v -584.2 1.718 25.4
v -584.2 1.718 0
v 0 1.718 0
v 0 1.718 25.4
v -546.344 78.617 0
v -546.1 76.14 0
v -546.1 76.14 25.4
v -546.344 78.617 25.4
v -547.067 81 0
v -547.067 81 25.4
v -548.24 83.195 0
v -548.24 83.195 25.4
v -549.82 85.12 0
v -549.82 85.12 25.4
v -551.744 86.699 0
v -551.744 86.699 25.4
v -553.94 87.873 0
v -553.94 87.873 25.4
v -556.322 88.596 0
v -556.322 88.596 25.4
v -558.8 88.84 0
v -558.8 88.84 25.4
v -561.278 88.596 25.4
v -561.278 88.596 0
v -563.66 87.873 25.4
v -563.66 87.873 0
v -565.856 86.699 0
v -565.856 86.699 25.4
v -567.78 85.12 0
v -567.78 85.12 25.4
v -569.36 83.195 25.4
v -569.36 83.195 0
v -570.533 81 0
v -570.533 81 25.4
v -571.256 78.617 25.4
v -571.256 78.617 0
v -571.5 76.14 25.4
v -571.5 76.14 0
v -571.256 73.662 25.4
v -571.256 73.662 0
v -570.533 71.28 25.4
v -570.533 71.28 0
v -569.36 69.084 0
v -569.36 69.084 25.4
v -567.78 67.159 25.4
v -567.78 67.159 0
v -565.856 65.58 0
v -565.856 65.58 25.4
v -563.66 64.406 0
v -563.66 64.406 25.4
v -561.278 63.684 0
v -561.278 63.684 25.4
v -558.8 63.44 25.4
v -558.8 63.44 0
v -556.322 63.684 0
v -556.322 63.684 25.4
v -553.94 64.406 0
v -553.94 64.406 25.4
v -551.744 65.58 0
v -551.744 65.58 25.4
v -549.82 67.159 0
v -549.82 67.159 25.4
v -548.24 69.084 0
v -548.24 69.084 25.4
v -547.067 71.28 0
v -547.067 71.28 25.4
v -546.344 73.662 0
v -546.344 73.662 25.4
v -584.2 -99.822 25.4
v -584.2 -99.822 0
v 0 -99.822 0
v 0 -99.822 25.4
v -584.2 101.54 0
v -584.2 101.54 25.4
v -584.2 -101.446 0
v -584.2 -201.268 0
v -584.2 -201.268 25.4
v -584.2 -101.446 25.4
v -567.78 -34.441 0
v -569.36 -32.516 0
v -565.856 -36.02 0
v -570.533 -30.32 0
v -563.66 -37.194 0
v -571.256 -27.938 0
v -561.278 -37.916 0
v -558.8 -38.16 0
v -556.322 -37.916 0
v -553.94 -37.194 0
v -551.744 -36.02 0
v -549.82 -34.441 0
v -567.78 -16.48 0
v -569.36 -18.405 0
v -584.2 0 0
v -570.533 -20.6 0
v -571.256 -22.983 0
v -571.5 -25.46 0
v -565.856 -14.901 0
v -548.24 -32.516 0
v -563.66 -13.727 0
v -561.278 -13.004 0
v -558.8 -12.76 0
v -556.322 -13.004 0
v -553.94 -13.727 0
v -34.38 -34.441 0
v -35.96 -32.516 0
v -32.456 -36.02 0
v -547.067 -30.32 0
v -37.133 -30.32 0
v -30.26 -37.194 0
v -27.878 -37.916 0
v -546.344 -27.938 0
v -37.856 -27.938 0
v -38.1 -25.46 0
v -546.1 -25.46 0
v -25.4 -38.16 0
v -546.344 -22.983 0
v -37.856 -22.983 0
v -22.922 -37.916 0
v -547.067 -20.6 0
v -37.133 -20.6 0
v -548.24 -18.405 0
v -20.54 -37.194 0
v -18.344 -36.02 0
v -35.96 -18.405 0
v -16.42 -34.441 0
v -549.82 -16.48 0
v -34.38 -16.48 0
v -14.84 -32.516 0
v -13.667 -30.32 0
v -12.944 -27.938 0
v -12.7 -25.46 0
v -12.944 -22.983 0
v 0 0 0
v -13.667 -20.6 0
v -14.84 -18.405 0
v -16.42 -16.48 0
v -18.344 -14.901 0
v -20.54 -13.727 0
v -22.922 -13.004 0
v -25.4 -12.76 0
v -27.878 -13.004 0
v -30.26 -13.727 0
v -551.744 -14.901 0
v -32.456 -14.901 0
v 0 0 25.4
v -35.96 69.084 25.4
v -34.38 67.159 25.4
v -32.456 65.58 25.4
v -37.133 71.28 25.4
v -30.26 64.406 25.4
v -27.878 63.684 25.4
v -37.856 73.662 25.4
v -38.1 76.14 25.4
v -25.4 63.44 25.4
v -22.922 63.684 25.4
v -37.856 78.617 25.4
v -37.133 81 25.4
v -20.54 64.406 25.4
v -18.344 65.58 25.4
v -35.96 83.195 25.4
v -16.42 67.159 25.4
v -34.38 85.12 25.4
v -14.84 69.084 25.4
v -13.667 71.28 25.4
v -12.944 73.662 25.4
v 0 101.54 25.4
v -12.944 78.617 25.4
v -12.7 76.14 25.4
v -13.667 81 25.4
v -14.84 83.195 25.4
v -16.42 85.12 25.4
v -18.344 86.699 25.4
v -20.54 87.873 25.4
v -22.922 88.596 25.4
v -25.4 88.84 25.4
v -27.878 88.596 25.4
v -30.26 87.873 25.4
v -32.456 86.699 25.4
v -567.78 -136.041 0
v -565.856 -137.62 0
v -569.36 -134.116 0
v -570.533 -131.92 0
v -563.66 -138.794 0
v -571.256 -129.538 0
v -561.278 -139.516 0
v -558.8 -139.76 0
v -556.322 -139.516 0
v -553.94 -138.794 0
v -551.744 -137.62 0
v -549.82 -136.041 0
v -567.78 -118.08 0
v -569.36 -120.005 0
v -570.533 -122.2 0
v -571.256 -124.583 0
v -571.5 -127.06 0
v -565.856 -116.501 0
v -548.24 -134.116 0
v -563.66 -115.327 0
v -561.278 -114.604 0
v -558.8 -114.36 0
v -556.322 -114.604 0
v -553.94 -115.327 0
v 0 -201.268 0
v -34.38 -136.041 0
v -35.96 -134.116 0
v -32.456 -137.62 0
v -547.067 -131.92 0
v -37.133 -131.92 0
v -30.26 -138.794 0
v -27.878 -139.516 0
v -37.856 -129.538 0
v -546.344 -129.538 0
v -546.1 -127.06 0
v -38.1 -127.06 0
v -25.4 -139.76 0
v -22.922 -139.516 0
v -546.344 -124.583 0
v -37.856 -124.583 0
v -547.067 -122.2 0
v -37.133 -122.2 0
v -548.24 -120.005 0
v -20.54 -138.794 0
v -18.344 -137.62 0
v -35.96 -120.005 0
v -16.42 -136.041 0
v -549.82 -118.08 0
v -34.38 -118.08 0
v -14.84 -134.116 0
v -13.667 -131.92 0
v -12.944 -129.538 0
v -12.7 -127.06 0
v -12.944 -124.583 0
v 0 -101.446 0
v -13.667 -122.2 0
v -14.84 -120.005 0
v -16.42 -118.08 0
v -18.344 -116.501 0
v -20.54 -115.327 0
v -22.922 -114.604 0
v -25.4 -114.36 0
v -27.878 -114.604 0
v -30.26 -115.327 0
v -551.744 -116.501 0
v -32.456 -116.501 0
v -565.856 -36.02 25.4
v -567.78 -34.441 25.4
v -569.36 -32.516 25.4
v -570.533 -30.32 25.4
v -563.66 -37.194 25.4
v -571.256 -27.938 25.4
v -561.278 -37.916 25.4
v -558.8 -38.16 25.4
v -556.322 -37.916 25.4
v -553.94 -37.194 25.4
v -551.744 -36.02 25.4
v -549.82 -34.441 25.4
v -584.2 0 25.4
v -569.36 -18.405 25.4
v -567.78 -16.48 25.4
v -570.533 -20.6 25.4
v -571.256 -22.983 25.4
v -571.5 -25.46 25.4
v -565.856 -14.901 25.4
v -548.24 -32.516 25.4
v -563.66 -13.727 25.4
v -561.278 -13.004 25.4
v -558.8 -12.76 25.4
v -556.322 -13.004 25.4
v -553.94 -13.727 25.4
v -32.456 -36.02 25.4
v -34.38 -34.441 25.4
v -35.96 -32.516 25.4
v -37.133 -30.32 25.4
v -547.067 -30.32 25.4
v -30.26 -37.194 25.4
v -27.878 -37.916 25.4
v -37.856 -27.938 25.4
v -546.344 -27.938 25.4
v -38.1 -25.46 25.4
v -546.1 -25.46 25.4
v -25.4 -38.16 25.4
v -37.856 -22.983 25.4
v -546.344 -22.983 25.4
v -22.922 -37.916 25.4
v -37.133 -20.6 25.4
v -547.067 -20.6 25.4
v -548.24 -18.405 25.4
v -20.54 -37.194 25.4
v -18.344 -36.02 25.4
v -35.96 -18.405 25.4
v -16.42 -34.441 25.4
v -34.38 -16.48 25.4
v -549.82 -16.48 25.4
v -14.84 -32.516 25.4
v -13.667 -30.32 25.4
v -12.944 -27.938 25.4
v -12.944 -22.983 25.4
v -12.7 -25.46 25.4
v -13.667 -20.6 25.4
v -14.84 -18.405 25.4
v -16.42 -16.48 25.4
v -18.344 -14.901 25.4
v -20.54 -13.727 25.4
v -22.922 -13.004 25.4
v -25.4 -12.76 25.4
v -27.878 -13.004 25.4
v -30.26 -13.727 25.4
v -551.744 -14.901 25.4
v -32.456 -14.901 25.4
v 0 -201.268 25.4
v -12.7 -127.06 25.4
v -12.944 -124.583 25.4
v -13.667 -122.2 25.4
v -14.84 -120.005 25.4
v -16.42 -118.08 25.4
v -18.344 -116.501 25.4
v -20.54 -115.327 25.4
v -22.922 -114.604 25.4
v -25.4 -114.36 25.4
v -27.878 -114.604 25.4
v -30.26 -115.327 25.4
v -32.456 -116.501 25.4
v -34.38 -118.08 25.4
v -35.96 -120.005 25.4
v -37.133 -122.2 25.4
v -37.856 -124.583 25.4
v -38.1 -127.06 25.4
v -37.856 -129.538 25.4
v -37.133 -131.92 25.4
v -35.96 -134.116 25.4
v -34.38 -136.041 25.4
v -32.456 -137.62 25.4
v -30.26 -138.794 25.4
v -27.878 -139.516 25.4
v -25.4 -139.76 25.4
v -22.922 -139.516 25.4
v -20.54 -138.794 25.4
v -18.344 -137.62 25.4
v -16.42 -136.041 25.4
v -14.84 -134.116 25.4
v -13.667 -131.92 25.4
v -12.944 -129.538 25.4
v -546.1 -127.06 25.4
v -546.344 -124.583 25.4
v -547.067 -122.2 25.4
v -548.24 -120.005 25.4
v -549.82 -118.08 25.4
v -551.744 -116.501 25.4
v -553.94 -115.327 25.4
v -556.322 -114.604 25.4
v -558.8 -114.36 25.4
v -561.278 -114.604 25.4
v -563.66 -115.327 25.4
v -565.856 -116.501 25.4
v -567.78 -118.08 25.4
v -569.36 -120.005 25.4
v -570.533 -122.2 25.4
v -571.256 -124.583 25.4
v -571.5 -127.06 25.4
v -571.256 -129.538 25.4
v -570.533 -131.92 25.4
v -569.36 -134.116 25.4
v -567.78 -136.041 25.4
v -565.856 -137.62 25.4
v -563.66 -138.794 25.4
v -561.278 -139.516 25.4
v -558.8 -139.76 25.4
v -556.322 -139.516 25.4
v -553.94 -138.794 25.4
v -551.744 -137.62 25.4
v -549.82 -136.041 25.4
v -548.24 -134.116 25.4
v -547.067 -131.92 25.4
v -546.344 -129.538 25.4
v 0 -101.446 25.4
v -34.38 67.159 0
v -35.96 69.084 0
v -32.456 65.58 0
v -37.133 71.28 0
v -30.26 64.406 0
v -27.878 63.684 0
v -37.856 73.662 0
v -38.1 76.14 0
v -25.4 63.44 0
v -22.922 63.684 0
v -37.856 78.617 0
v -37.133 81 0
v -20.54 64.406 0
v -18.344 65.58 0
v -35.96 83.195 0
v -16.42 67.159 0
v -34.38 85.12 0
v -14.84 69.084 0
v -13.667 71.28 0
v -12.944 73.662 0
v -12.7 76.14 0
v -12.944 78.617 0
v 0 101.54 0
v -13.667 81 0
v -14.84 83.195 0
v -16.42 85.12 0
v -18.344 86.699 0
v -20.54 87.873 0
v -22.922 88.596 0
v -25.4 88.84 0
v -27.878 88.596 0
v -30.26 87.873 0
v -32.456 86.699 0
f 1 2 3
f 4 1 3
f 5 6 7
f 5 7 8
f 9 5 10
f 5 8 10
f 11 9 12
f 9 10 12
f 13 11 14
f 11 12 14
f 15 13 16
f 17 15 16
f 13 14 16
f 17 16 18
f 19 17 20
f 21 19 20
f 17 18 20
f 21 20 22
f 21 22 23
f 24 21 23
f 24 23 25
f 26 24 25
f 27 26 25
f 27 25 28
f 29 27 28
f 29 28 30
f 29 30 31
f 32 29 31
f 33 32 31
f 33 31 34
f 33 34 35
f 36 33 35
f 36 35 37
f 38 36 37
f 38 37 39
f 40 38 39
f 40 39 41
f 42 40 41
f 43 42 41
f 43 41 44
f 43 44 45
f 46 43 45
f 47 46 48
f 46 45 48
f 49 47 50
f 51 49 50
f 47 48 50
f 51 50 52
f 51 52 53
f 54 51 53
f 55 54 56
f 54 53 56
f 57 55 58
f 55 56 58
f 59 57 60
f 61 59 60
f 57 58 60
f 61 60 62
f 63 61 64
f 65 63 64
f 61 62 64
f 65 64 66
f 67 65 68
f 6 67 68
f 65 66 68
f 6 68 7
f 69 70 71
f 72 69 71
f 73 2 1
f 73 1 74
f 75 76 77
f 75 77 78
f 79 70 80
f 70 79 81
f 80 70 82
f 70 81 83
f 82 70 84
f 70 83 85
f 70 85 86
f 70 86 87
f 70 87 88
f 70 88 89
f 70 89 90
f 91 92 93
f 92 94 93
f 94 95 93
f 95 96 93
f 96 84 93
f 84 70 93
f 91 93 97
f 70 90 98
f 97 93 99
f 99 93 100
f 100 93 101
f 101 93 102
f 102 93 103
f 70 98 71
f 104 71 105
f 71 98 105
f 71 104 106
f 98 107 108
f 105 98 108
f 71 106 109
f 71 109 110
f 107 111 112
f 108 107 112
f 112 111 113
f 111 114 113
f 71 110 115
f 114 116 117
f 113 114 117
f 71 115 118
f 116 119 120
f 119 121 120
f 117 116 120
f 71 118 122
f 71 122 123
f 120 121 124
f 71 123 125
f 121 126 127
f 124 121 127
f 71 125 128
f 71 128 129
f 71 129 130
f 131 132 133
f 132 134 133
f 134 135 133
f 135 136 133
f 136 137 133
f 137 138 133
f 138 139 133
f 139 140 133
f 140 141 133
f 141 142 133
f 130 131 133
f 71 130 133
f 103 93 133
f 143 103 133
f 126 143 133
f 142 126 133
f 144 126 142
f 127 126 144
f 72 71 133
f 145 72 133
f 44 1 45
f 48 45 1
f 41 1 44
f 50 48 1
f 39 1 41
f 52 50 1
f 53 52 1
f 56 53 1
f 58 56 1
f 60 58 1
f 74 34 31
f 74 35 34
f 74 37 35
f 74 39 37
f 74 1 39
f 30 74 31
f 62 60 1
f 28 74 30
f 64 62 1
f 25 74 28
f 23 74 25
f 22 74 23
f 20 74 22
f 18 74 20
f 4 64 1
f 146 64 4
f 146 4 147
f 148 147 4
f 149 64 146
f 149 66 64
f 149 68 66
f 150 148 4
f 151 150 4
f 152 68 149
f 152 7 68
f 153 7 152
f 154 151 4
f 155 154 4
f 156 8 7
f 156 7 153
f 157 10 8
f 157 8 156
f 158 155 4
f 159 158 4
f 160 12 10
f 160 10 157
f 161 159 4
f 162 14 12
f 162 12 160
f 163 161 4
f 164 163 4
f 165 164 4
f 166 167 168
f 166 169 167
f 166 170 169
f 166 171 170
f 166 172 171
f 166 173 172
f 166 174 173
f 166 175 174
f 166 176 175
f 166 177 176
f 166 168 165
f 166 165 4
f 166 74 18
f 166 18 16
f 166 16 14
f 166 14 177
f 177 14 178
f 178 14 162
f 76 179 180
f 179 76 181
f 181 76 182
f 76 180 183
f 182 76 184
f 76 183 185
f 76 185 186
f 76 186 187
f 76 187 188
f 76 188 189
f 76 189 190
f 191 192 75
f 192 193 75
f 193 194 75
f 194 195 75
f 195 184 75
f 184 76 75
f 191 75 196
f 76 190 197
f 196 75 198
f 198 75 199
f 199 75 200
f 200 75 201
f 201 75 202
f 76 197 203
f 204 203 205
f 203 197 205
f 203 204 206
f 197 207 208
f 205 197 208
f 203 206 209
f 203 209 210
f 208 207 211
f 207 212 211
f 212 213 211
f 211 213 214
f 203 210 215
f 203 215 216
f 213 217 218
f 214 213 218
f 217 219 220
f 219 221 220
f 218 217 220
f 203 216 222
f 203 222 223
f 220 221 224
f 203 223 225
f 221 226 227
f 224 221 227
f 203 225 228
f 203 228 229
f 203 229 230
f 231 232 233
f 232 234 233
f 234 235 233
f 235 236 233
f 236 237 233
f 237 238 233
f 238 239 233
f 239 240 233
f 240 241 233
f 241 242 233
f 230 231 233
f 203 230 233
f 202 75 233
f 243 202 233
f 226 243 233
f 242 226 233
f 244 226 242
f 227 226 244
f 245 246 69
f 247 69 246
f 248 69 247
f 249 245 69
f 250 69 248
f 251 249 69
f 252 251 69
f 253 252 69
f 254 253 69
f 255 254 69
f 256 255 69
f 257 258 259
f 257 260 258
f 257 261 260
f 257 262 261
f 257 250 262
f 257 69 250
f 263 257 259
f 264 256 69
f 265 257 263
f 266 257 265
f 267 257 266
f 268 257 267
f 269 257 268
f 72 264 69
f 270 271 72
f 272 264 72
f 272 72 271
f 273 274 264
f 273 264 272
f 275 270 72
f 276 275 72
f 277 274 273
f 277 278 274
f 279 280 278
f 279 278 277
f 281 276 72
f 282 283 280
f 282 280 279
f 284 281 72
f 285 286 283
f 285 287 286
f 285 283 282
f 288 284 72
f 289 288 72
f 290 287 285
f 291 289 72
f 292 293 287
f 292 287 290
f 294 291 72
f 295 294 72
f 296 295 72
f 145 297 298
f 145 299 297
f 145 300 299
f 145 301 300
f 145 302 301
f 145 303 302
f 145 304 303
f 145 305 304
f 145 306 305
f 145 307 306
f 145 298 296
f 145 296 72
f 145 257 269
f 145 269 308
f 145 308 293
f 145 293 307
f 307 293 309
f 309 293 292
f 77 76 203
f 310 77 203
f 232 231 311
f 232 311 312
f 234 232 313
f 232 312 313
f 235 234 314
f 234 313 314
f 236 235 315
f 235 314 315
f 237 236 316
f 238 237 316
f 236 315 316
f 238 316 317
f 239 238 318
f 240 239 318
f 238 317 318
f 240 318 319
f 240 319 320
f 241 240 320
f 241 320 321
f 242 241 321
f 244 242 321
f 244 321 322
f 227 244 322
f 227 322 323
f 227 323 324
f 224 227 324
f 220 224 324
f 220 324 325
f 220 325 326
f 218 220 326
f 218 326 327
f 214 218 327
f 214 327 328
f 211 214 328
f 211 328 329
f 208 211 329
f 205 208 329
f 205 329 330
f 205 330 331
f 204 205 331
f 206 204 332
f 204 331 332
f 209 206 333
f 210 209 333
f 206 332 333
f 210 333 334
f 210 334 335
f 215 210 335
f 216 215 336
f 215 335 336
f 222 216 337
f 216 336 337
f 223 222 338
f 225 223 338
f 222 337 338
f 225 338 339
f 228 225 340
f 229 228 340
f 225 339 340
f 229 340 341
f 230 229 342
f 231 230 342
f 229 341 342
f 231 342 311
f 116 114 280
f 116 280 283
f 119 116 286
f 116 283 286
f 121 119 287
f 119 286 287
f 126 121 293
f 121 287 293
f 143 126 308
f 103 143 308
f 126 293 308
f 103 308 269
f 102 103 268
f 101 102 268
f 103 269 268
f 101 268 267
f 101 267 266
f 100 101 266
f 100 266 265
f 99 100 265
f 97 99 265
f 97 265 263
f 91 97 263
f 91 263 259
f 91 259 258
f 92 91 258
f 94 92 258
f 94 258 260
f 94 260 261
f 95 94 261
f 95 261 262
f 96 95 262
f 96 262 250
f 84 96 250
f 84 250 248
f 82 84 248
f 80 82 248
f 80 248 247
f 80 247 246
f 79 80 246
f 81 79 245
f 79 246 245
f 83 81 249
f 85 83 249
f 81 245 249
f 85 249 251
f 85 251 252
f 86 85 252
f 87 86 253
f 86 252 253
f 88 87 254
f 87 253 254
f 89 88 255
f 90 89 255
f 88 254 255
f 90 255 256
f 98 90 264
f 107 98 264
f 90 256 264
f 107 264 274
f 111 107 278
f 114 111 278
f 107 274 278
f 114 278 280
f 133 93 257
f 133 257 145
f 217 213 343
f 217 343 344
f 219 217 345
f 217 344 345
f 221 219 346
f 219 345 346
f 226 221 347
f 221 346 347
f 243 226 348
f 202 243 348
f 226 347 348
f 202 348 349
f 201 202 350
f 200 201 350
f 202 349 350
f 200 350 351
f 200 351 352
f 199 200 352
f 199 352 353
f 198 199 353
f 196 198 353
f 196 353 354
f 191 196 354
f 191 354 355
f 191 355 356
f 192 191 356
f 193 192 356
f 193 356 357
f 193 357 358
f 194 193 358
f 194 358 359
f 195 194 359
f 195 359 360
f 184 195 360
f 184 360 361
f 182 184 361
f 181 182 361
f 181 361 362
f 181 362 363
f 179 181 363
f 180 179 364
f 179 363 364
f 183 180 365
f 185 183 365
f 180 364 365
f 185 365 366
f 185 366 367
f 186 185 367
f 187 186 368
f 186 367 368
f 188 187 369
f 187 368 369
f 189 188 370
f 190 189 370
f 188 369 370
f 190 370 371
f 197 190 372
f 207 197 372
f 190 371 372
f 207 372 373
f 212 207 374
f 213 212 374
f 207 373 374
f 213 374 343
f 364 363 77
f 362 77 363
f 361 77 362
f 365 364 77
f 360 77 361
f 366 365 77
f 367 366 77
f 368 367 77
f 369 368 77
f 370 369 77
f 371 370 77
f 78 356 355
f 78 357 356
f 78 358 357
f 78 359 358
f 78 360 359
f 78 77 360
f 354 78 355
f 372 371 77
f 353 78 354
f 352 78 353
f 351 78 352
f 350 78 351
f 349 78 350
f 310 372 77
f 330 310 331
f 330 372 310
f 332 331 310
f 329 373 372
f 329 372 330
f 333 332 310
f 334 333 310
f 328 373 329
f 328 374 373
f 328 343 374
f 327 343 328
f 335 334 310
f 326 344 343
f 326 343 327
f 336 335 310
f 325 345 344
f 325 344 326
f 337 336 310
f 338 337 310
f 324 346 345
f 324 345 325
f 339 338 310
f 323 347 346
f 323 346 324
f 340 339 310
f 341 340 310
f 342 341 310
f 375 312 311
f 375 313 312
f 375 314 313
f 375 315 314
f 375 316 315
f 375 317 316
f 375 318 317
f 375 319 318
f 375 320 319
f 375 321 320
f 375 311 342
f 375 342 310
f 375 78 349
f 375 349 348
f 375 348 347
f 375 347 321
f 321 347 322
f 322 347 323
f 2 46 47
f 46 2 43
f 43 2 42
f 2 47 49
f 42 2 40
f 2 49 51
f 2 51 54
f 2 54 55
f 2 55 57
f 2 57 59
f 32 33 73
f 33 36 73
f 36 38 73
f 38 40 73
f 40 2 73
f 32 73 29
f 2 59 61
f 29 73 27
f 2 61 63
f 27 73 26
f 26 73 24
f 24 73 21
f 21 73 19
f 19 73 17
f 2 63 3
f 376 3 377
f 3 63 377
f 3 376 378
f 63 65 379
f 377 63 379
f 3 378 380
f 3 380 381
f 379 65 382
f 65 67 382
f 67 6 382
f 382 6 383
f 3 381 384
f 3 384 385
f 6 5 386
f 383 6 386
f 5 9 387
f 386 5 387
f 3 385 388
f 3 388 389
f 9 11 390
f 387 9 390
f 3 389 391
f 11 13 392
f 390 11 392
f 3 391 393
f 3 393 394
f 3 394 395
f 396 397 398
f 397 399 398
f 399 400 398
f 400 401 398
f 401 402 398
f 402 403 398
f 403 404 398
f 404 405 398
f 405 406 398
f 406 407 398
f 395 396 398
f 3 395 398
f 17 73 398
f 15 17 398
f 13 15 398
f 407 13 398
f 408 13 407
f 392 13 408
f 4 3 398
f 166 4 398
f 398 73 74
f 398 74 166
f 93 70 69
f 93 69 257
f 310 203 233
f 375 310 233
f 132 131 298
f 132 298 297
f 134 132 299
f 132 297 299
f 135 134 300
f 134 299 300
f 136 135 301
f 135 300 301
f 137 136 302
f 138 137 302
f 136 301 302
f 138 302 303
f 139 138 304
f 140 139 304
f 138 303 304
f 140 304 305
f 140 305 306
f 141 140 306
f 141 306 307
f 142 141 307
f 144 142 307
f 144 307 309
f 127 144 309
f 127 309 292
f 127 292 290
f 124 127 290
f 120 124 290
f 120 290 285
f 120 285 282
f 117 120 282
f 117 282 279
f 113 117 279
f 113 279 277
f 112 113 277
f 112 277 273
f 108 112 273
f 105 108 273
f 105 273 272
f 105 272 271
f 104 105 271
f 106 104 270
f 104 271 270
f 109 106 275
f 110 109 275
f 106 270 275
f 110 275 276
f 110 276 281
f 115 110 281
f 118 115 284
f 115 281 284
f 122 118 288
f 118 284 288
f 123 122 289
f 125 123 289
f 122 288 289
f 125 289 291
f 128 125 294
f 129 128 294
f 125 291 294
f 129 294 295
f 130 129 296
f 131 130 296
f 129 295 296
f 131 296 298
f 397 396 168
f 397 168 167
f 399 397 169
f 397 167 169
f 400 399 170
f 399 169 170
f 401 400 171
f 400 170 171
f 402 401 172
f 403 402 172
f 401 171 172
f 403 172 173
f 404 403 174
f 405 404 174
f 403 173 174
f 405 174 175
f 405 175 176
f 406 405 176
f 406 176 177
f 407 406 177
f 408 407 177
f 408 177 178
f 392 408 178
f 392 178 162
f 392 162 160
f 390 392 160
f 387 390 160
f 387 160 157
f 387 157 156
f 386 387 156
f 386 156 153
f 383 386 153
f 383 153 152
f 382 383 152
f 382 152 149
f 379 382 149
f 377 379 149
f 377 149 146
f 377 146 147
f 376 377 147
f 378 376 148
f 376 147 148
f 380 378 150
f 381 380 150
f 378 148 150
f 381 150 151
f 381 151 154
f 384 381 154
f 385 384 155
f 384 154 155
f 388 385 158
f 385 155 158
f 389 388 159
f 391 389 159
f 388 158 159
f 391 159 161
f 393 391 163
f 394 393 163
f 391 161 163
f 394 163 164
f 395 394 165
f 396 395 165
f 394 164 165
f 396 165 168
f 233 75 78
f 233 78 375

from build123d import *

# Parameters (mm, degrees)
SKETCH1_W             = 584.2
SKETCH1_H             = 99.822
BOSS_EXTRUDE1_DEPTH   = 25.4
BOSS_EXTRUDE1_2_DEPTH = 25.4
BOSS_EXTRUDE1_3_DEPTH = 25.4
SKETCH2_R             = 12.7
CUT_EXTRUDE1_DEPTH    = 26.4
LPATTERN1_COUNT       = 3
LPATTERN1_PITCH       = 101.6


with BuildPart() as part:
    # Sketch1 → Boss-Extrude1 (new body)
    with BuildSketch(Plane.XY):
        with Locations((-292.1, -49.911)):
            Rectangle(SKETCH1_W, SKETCH1_H)
    extrude(amount=BOSS_EXTRUDE1_DEPTH)


with BuildPart() as body_2:
    # Sketch1 → Boss-Extrude1 2 (new body)
    with BuildSketch(Plane.XY):
        with Locations((-292.1, 51.628691072)):
            Rectangle(SKETCH1_W, SKETCH1_H)
    extrude(amount=BOSS_EXTRUDE1_2_DEPTH)

    # Sketch2 → Cut-Extrude1 (cut, through all)
    with BuildSketch(Plane.XY.offset(25.4)):
        with Locations((-558.8, 76.139691072)):
            Circle(SKETCH2_R)
        with Locations((-25.4, 76.139691072)):
            Circle(SKETCH2_R)
    cut_extrude1 = extrude(amount=-CUT_EXTRUDE1_DEPTH, mode=Mode.SUBTRACT)


with BuildPart() as body_3:
    # Sketch1 → Boss-Extrude1 3 (new body)
    with BuildSketch(Plane.XY):
        with Locations((-292.1, -151.356836193)):
            Rectangle(SKETCH1_W, SKETCH1_H)
    extrude(amount=BOSS_EXTRUDE1_3_DEPTH)


with BuildPart() as lpattern1_tool:
    # LPattern1: Cut-Extrude1 ×3
    with Locations(*[(0, -i * LPATTERN1_PITCH, 0) for i in range(1, LPATTERN1_COUNT)]):
        add(cut_extrude1)


with BuildPart() as part_1:
    add(part.part)

    # LPattern1: cut by lpattern1_tool
    add(lpattern1_tool.part, mode=Mode.SUBTRACT)


with BuildPart() as body_3_1:
    add(body_3.part)

    # LPattern1: cut by lpattern1_tool
    add(lpattern1_tool.part, mode=Mode.SUBTRACT)


solid = Compound([body_2.part, part_1.part, body_3_1.part])
